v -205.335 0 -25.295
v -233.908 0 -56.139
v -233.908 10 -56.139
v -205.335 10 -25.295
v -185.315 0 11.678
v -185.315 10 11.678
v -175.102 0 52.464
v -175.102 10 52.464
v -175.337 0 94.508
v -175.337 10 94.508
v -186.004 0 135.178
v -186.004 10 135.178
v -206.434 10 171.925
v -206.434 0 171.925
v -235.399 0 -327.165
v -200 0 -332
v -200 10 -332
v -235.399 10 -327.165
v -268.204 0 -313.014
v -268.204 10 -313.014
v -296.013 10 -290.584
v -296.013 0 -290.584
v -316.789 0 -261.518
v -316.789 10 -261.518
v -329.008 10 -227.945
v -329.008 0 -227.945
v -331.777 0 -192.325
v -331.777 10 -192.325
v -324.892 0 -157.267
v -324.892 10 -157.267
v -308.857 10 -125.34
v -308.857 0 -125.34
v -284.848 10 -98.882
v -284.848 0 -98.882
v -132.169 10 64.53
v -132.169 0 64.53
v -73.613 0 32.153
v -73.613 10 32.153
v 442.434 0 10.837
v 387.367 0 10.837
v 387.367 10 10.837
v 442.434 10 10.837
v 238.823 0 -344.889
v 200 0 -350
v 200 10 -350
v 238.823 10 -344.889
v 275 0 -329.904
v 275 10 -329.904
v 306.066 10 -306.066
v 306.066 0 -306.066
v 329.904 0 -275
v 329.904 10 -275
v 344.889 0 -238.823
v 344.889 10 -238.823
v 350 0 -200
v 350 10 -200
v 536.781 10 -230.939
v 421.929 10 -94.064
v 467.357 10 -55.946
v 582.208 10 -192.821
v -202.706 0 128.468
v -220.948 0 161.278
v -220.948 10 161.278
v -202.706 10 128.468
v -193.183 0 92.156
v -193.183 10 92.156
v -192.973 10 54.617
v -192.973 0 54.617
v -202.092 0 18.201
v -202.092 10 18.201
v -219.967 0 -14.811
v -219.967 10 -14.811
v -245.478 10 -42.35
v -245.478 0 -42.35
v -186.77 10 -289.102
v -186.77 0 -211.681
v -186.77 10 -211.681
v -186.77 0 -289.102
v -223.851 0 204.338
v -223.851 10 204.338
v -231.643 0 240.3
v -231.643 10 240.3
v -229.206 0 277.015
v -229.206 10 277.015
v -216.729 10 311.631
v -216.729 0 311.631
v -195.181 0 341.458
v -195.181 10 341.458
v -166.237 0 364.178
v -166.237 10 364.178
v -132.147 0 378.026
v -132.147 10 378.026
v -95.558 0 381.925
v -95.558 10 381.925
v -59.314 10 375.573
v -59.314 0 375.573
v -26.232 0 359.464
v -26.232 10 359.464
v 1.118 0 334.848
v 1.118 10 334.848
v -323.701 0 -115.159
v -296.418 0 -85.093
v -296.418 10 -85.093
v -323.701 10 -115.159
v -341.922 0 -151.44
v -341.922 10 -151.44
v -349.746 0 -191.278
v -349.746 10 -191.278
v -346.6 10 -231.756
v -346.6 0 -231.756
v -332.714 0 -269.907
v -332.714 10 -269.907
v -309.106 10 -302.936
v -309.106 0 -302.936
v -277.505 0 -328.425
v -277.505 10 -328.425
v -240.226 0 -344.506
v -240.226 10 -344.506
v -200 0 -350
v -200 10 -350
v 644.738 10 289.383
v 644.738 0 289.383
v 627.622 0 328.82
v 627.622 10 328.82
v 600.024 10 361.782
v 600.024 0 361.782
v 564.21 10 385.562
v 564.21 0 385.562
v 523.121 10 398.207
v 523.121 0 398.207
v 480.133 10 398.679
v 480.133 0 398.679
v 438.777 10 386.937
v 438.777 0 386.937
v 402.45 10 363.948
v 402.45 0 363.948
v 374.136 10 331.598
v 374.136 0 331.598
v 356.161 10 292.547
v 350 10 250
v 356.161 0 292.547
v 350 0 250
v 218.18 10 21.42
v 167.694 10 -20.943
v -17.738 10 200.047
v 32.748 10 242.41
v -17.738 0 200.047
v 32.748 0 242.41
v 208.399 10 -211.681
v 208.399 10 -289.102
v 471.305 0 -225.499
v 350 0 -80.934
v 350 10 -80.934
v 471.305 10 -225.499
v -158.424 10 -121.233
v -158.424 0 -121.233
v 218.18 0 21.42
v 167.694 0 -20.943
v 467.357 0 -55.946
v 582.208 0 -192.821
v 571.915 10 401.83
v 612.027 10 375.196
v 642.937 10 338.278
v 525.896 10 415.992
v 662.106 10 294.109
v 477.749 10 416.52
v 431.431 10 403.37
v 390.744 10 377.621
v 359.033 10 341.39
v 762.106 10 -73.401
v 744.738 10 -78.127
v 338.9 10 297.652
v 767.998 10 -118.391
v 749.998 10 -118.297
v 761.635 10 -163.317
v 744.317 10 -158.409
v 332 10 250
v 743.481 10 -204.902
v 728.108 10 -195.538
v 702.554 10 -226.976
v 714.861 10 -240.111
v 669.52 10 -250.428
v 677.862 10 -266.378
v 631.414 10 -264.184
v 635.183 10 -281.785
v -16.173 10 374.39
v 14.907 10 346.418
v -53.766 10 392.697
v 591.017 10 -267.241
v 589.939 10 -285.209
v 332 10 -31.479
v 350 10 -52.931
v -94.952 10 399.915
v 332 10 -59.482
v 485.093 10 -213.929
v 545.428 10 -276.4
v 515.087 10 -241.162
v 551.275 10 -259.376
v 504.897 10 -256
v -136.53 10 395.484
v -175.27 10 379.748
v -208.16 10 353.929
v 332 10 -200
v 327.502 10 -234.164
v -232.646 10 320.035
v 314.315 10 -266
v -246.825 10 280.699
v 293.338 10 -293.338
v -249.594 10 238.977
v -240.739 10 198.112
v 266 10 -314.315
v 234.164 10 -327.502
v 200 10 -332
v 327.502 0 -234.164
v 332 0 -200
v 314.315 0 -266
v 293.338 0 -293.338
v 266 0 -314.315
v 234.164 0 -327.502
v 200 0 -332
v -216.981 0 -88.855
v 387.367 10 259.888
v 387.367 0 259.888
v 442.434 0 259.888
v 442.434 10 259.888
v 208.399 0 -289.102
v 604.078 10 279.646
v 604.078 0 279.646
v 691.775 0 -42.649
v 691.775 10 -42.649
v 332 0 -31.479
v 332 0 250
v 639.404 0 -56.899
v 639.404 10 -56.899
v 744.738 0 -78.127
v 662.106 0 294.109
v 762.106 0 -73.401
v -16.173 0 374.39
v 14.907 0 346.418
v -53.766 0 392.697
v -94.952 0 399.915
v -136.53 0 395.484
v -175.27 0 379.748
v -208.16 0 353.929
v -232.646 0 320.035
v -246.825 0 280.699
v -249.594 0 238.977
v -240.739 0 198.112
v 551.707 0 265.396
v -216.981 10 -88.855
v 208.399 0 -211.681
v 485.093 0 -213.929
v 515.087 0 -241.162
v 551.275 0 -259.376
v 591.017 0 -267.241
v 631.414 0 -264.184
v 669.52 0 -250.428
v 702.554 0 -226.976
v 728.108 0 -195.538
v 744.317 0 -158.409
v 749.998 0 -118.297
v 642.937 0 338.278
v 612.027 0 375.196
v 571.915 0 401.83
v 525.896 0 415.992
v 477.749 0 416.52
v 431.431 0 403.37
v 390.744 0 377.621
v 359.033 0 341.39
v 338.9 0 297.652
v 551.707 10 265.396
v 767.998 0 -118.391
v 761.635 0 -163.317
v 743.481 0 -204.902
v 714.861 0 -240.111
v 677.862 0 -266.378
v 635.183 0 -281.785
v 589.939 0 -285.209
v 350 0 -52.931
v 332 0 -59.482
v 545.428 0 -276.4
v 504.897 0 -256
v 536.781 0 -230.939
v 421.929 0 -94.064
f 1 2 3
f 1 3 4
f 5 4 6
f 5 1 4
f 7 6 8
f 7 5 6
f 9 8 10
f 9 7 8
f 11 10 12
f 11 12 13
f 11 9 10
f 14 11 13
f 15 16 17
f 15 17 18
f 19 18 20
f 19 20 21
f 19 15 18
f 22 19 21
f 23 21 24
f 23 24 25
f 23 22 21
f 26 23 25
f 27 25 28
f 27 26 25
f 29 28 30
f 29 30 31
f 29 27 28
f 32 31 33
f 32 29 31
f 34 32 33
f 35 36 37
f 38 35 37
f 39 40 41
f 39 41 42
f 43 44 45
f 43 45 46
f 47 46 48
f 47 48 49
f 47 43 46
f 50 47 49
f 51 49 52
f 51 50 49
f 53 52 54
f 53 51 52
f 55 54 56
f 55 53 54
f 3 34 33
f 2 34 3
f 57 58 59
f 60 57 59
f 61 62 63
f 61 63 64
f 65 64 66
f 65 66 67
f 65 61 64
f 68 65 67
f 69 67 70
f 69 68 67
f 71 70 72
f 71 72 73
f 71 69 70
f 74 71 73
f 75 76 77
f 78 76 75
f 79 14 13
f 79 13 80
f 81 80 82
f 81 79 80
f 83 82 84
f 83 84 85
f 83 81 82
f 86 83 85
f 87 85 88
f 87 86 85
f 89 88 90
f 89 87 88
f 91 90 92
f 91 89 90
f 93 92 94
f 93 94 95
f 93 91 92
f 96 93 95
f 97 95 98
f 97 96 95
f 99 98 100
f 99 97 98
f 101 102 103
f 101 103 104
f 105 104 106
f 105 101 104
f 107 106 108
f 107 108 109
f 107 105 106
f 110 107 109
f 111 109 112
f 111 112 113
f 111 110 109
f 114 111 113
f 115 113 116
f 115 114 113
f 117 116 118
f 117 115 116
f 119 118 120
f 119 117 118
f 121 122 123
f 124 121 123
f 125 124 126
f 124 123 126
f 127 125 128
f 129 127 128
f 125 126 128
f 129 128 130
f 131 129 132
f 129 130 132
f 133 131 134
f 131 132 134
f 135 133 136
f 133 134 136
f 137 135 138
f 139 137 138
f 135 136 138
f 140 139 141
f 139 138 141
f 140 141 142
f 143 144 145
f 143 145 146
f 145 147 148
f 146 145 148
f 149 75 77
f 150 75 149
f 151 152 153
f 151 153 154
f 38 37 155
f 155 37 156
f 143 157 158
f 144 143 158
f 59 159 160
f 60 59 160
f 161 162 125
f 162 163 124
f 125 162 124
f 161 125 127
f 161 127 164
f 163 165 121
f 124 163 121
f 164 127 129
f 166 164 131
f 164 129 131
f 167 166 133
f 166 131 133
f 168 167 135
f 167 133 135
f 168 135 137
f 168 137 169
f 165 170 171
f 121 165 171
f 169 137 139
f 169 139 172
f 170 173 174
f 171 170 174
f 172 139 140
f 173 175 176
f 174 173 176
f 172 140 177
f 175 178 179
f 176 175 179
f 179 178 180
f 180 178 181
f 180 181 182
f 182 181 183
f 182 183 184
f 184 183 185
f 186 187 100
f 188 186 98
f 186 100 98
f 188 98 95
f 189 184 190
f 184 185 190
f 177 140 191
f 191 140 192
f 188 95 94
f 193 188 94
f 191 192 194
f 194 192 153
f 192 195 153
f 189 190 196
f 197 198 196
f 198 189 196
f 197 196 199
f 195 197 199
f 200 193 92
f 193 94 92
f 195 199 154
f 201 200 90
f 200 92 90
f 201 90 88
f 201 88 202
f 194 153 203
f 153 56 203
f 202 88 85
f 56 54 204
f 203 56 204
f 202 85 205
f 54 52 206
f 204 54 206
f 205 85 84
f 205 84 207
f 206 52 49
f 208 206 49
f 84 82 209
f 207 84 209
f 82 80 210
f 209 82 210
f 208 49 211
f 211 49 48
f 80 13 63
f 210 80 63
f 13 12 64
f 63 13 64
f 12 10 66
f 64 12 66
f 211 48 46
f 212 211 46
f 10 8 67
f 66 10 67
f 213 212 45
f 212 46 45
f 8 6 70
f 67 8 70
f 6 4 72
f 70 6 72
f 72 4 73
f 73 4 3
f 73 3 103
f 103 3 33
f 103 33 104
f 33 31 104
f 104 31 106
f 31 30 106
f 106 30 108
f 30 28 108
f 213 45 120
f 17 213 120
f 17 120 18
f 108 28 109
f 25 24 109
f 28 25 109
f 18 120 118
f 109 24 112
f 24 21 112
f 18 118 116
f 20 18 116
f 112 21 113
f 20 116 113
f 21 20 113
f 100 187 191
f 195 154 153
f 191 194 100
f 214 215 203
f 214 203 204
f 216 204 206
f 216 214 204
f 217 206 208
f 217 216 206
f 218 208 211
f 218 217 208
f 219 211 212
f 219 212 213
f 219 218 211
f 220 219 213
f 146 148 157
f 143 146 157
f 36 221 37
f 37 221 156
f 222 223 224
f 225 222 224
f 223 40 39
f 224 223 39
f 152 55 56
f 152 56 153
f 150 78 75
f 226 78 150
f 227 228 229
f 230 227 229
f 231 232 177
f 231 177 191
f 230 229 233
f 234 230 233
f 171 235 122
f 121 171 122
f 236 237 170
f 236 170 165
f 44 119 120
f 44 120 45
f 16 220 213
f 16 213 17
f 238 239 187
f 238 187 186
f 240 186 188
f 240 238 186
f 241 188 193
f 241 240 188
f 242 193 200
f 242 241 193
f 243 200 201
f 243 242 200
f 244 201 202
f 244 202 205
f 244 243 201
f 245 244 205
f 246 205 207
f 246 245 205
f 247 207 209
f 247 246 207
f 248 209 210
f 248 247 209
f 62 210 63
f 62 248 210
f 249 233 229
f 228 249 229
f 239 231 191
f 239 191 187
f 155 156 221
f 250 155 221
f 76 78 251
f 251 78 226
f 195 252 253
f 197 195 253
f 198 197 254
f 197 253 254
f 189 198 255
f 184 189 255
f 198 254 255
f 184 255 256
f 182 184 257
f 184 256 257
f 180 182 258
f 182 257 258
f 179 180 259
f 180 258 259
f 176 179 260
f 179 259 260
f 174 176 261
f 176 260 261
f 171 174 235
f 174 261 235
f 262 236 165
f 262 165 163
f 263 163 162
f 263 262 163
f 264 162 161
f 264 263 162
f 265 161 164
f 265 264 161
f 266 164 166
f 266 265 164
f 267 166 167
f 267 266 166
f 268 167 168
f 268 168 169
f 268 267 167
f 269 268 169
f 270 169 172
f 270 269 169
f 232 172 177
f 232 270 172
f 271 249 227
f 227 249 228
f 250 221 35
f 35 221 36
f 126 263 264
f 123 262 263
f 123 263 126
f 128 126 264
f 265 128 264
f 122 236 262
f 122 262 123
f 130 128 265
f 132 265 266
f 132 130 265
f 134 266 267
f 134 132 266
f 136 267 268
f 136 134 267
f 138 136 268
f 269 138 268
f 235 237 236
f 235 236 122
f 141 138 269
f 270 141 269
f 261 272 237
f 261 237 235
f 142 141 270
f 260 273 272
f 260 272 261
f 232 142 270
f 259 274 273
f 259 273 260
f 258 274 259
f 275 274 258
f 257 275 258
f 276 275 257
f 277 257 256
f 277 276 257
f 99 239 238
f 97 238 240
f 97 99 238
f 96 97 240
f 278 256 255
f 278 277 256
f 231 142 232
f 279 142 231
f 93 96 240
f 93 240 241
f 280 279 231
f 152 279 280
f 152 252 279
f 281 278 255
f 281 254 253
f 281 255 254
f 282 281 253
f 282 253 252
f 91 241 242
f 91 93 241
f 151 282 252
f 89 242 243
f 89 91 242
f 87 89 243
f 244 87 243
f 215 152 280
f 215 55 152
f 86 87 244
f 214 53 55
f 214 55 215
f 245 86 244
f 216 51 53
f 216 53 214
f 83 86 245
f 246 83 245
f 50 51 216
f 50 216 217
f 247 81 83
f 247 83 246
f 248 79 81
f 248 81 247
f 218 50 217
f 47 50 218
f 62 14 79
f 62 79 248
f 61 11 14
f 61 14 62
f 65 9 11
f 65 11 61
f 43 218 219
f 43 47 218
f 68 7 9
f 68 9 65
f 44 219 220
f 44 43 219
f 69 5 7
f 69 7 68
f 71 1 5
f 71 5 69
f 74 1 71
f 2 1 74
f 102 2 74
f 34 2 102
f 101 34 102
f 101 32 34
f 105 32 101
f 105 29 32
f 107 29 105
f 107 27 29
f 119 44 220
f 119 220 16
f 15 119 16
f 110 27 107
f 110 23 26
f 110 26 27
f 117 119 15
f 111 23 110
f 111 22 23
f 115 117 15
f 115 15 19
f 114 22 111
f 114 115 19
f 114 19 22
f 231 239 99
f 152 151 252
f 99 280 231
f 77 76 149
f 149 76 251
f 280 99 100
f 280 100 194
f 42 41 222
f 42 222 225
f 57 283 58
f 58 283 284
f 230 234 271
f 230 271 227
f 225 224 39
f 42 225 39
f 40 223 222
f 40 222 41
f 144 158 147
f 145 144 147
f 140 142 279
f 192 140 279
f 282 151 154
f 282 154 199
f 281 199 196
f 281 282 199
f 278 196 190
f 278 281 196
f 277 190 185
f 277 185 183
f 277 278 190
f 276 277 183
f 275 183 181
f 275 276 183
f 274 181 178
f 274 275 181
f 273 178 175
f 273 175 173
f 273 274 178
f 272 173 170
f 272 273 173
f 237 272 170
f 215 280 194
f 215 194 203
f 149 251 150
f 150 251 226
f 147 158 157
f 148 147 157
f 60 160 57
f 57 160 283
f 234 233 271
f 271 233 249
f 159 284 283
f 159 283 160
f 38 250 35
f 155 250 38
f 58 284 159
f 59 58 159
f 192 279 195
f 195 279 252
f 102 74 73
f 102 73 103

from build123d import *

# Parameters (mm, degrees)
BOSS_EXTRUDE1_DEPTH   = 10
BOSS_EXTRUDE4_DEPTH   = 10
CUT_EXTRUDE1_DEPTH    = 875.441536067
BOSS_EXTRUDE5_DEPTH   = 10
SKETCH7_W             = 395.169169126
SKETCH7_H             = 77.42054027
BOSS_EXTRUDE5_2_DEPTH = 10
BOSS_EXTRUDE5_3_DEPTH = 10
SKETCH7_W_2           = 55.067842443
SKETCH7_H_2           = 249.05025975
BOSS_EXTRUDE5_4_DEPTH = 10
BOSS_EXTRUDE5_5_DEPTH = 10
BOSS_EXTRUDE5_6_DEPTH = 10


with BuildPart() as part:
    # Sketch4 → Boss-Extrude1 (new body)
    with BuildSketch(Plane(origin=(0, 0, 0), x_dir=(1, 0, 0), z_dir=(0, 1, 0))):
        with BuildLine():
            Line((350, 200), (350, 52.930542638))
            Line((350, 52.930542638), (14.906666468, -346.418141453))
            ThreePointArc((14.906666468, -346.418141453), (-192.619131059, -367.990239265), (-220.948265722, -161.2784298))
            ThreePointArc((-220.948265722, -161.2784298), (-192.973217507, -54.616776941), (-245.478389991, 42.349806868))
            Line((-245.478389991, 42.349806868), (-296.418141453, 85.093333532))
            ThreePointArc((-296.418141453, 85.093333532), (-340.953893118, 251.303021499), (-200, 350))
            Line((-200, 350), (200, 350))
            ThreePointArc((200, 350), (306.066017178, 306.066017178), (350, 200))
        make_face()
        with BuildLine():
            Line((1.117866492, -334.847964479), (332, 59.482006855))
            Line((332, 59.482006855), (332, 200))
            ThreePointArc((332, 200), (293.338095117, 293.338095117), (200, 332))
            Line((200, 332), (-200, 332))
            ThreePointArc((-200, 332), (-324.039425944, 245.146658919), (-284.847964479, 98.882133508))
            Line((-284.847964479, 98.882133508), (-233.908213017, 56.138606845))
            ThreePointArc((-233.908213017, 56.138606845), (-175.102419834, -52.463967022), (-206.434473835, -171.925018224))
            ThreePointArc((-206.434473835, -171.925018224), (-181.504835332, -353.831410553), (1.117866492, -334.847964479))
        make_face(mode=Mode.SUBTRACT)
    extrude(amount=BOSS_EXTRUDE1_DEPTH)

    # Sketch5 → Boss-Extrude4 (add)
    with BuildSketch(Plane(origin=(0, 0, 0), x_dir=(1, 0, 0), z_dir=(0, 1, 0))):
        with BuildLine():
            Line((762.106058652, 73.40111888), (662.106058652, -294.109247878))
            ThreePointArc((662.106058652, -294.109247878), (477.749357914, -416.519995576), (332, -250))
            Line((332, -250), (332, 31.478977972))
            Line((332, 31.478977972), (350, 52.930542638))
            Line((350, 52.930542638), (350, 80.933571522))
            Line((350, 80.933571522), (471.304533556, 225.498685185))
            ThreePointArc((471.304533556, 225.498685185), (677.86195693, 266.377810019), (762.106058652, 73.40111888))
        make_face()
    extrude(amount=BOSS_EXTRUDE4_DEPTH)

    # Sketch6 → Cut-Extrude1 (cut, through all)
    with BuildSketch(Plane(origin=(0, 0, 0), x_dir=(1, 0, 0), z_dir=(0, 1, 0))):
        with BuildLine():
            Line((744.737552368, 78.127109724), (644.737552368, -289.383257034))
            ThreePointArc((644.737552368, -289.383257034), (480.13335528, -398.678567479), (350, -250))
            Line((350, -250), (350, 52.930542638))
            Line((350, 52.930542638), (485.093333532, 213.928508211))
            ThreePointArc((485.093333532, 213.928508211), (669.519604402, 250.427726812), (744.737552368, 78.127109724))
        make_face()
    extrude(amount=CUT_EXTRUDE1_DEPTH, mode=Mode.SUBTRACT)


with BuildPart() as body_2:
    # Sketch7 → Boss-Extrude5 (new body)
    with BuildSketch(Plane(origin=(0, 0, 0), x_dir=(1, 0, 0), z_dir=(0, 1, 0))):
        Polygon((32.748032026, -242.409656931), (218.180421735, -21.419940312), (167.694190818, 20.94303743), (-17.738198891, -200.046679189), align=None)
    extrude(amount=BOSS_EXTRUDE5_DEPTH)


with BuildPart() as body_3:
    # Sketch7 → Boss-Extrude5 2 (new body)
    with BuildSketch(Plane(origin=(0, 0, 0), x_dir=(1, 0, 0), z_dir=(0, 1, 0))):
        with Locations((10.81485439, 250.391573314)):
            Rectangle(SKETCH7_W, SKETCH7_H)
    extrude(amount=BOSS_EXTRUDE5_2_DEPTH)


with BuildPart() as body_4:
    # Sketch7 → Boss-Extrude5 3 (new body)
    with BuildSketch(Plane(origin=(0, 0, 0), x_dir=(1, 0, 0), z_dir=(0, 1, 0))):
        Polygon((604.078060814, -279.646065012), (691.774991352, 42.649246046), (639.404124107, 56.899420187), (551.707193568, -265.395890872), align=None)
    extrude(amount=BOSS_EXTRUDE5_3_DEPTH)


with BuildPart() as body_5:
    # Sketch7 → Boss-Extrude5 4 (new body)
    with BuildSketch(Plane(origin=(0, 0, 0), x_dir=(1, 0, 0), z_dir=(0, 1, 0))):
        with Locations((414.900552271, -135.362490407)):
            Rectangle(SKETCH7_W_2, SKETCH7_H_2)
    extrude(amount=BOSS_EXTRUDE5_4_DEPTH)


with BuildPart() as body_6:
    # Sketch7 → Boss-Extrude5 5 (new body)
    with BuildSketch(Plane(origin=(0, 0, 0), x_dir=(1, 0, 0), z_dir=(0, 1, 0))):
        Polygon((-216.980596567, 88.855111246), (-132.16915587, -64.530345215), (-73.612877021, -32.152814218), (-158.424317717, 121.232642243), align=None)
    extrude(amount=BOSS_EXTRUDE5_5_DEPTH)


with BuildPart() as body_7:
    # Sketch7 → Boss-Extrude5 6 (new body)
    with BuildSketch(Plane(origin=(0, 0, 0), x_dir=(1, 0, 0), z_dir=(0, 1, 0))):
        Polygon((536.780734207, 230.939292617), (421.92884631, 94.064142599), (467.356573726, 55.94575328), (582.208461623, 192.820903297), align=None)
    extrude(amount=BOSS_EXTRUDE5_6_DEPTH)


solid = Compound([part.part, body_2.part, body_3.part, body_4.part, body_5.part, body_6.part, body_7.part])
